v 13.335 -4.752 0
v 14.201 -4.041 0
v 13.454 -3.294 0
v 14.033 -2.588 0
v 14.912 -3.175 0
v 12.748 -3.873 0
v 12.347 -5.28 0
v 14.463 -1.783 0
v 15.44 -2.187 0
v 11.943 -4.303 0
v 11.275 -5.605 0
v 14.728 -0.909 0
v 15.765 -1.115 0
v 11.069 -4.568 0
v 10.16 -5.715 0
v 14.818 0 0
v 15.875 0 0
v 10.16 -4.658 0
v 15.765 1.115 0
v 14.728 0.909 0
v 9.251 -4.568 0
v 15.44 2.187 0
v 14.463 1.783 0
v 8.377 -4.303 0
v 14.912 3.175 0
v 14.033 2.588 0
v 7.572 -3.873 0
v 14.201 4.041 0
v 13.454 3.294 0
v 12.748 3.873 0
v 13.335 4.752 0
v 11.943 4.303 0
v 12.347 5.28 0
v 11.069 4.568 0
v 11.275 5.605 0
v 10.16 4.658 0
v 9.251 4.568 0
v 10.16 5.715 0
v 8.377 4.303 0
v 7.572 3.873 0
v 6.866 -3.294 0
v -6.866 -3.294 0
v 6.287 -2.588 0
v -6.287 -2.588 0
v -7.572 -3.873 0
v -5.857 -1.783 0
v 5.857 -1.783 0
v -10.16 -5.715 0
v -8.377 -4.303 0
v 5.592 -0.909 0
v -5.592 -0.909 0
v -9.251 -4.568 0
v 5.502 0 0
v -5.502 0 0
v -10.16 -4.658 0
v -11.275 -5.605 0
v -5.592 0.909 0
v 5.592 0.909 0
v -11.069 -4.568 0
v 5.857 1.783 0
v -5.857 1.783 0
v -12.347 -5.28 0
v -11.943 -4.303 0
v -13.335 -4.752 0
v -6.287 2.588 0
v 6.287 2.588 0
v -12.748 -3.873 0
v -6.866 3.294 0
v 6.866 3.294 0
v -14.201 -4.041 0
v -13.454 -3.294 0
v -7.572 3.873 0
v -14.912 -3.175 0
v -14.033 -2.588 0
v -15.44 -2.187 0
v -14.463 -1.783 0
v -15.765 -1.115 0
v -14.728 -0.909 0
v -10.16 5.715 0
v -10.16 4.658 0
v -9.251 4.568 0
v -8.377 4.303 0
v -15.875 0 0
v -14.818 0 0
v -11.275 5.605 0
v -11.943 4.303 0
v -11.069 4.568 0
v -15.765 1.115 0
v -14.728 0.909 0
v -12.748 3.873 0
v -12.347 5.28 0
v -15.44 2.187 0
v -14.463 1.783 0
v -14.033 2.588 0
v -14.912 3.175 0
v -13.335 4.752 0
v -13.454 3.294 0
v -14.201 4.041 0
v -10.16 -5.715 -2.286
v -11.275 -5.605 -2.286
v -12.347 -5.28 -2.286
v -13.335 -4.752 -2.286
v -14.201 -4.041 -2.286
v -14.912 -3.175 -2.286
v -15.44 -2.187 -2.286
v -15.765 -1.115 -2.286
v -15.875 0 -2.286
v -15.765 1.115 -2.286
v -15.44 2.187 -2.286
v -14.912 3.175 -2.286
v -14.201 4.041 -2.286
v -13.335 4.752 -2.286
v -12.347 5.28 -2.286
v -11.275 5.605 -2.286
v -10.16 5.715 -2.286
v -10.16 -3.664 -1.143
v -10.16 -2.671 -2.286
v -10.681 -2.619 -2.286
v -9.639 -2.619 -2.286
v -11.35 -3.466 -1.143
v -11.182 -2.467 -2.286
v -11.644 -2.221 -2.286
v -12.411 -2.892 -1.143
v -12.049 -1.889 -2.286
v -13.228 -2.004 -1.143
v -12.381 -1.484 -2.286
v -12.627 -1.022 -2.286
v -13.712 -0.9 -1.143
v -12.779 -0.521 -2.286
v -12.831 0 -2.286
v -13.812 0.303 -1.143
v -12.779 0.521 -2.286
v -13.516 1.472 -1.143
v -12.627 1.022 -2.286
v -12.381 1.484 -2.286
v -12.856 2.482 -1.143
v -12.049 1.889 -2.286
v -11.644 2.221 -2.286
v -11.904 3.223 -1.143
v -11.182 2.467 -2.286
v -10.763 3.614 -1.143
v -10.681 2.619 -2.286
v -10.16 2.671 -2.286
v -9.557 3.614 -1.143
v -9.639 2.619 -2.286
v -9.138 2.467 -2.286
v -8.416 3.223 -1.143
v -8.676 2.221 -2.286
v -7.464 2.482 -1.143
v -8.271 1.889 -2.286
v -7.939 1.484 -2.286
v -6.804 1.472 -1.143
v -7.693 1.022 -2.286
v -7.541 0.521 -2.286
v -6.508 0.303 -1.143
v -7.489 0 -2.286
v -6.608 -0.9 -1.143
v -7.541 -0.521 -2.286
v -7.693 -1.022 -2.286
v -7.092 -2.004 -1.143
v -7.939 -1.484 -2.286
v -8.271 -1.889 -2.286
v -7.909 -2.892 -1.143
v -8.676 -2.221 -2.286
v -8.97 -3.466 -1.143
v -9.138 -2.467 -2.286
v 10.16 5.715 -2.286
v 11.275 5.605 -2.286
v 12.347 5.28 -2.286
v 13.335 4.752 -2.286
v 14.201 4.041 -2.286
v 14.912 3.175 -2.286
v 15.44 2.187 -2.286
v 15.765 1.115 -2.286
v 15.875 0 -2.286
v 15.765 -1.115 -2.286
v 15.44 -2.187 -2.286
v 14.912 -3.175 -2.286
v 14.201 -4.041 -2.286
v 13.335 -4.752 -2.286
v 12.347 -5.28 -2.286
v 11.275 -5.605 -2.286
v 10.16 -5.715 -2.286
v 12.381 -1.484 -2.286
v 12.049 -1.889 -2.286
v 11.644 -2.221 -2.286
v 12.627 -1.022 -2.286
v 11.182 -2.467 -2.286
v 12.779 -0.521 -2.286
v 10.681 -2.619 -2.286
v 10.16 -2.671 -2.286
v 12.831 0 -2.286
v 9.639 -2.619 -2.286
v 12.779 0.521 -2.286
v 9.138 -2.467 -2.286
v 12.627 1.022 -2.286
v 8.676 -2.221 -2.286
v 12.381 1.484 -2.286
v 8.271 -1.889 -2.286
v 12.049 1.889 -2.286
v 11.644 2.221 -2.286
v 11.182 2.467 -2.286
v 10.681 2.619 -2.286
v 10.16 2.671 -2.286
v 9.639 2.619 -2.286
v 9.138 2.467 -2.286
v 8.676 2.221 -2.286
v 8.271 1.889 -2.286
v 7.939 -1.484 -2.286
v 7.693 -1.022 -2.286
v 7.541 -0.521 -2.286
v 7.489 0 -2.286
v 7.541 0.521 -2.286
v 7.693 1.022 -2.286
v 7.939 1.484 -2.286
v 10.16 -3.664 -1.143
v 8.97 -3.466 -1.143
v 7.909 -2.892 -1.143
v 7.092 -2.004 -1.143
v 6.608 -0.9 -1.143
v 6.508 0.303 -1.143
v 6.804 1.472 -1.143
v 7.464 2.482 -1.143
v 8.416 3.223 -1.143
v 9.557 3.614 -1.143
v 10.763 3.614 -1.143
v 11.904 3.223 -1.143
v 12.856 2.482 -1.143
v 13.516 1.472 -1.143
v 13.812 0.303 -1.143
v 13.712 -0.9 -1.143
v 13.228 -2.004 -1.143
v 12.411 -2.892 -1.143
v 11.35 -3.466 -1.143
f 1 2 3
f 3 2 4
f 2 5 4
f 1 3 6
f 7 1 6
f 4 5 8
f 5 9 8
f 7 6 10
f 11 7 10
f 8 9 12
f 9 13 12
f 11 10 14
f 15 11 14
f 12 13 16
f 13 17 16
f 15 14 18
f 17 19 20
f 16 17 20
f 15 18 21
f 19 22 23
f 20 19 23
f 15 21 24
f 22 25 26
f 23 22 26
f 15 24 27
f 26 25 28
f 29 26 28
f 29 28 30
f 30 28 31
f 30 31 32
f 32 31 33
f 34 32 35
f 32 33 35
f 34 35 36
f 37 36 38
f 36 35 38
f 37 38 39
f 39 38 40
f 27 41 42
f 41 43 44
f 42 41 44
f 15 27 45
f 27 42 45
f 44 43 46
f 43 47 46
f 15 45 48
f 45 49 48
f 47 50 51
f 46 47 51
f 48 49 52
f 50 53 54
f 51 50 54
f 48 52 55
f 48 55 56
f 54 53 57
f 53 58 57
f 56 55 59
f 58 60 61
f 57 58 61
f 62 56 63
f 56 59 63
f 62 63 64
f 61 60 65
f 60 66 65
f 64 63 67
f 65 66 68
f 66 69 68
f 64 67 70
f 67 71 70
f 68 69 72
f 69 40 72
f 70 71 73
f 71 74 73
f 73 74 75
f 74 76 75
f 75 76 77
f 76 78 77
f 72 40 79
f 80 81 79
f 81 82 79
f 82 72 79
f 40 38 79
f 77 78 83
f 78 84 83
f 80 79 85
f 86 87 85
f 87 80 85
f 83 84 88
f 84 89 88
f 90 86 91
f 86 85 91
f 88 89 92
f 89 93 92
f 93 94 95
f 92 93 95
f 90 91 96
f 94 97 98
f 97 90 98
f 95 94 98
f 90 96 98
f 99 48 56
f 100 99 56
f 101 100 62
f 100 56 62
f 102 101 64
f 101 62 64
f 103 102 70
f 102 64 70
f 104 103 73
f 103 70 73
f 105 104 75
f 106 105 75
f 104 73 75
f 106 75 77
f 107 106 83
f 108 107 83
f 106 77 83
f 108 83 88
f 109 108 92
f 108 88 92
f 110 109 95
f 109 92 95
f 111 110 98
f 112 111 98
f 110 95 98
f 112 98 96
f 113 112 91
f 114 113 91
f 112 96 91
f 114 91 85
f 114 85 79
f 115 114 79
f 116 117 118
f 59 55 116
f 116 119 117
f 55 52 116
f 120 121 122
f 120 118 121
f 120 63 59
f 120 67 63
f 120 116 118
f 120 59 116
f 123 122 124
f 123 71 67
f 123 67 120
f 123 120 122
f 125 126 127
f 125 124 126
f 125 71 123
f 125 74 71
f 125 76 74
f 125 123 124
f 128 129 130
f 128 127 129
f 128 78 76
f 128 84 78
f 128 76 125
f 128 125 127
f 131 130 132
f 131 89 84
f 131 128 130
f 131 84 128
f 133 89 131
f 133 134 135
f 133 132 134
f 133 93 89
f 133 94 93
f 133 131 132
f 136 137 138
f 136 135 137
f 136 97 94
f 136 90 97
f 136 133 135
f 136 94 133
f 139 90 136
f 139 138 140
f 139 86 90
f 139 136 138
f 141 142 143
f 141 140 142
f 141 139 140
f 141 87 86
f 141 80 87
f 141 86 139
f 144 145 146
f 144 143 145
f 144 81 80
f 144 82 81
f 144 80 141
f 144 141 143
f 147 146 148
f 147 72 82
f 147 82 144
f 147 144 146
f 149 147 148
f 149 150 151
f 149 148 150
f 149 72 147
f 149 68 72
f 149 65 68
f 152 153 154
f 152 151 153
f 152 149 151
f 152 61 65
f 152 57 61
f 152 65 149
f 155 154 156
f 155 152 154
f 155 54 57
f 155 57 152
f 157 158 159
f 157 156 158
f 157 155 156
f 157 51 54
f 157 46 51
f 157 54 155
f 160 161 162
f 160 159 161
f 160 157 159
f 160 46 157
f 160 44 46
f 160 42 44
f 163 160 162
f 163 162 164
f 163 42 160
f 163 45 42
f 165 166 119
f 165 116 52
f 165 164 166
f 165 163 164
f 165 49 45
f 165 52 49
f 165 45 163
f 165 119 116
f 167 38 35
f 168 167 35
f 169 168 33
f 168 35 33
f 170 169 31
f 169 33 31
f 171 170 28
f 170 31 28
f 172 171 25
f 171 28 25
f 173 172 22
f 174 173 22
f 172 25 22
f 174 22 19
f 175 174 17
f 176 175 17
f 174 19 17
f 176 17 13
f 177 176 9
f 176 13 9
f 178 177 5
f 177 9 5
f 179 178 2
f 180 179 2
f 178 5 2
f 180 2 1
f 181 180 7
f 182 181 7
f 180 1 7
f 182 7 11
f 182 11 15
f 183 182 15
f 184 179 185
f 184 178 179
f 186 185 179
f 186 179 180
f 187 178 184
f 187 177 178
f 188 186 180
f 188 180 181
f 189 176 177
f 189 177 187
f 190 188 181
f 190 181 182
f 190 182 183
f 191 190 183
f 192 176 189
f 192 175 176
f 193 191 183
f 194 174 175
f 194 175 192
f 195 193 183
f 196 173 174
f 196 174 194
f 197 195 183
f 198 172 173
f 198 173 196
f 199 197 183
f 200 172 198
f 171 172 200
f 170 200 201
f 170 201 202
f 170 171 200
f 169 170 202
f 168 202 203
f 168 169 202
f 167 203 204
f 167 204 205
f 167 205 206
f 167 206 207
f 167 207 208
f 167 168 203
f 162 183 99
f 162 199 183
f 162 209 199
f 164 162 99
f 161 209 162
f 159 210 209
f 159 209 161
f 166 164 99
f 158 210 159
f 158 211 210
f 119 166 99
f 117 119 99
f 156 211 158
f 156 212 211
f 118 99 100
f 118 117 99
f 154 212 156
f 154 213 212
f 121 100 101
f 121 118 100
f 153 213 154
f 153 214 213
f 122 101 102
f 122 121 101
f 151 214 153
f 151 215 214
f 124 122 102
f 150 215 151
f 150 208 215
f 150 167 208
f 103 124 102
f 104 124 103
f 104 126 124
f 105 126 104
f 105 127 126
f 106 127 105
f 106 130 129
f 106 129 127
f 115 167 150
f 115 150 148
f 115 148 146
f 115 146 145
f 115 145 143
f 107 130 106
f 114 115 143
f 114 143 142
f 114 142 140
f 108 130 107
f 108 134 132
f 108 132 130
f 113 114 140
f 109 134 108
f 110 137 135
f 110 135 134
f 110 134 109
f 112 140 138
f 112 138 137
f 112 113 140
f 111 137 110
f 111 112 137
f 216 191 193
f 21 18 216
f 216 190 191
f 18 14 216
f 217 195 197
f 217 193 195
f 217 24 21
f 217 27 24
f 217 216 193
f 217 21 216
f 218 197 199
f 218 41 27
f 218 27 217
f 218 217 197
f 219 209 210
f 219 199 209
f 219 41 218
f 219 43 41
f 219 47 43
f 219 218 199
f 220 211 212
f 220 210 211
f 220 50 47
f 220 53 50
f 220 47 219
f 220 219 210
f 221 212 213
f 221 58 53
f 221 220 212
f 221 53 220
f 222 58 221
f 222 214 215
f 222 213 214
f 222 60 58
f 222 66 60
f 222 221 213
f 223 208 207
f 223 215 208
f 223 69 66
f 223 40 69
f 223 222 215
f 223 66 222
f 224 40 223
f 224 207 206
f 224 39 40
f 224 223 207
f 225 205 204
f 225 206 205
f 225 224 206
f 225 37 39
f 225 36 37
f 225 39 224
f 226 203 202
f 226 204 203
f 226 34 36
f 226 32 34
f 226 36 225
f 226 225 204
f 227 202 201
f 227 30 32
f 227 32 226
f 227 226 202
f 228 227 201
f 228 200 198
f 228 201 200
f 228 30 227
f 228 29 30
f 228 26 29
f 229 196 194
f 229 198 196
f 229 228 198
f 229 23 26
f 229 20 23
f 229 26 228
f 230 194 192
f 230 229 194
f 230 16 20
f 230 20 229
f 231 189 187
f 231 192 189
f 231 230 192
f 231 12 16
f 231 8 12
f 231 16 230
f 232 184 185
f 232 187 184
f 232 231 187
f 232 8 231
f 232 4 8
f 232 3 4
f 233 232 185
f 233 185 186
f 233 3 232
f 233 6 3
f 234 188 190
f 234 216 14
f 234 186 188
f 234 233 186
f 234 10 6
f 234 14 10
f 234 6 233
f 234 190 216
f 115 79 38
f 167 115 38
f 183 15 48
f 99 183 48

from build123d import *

# Parameters (mm, degrees)
BASE_FLANGE1_DEPTH                            = 2.286
CSK_FOR_8_FLAT_HEAD_MACHINE_SCREW1_AT_2_COUNT = 2
CSK_FOR_8_FLAT_HEAD_MACHINE_SCREW1_AT_2_PITCH = 20.32


# Sheet-metal steps are written as plain solids
with BuildPart() as part:
    # Sketch1 → Base-Flange1 (new body)
    with BuildSketch(Plane.XY):
        with BuildLine():
            Line((10.16, -5.715), (-10.16, -5.715))
            ThreePointArc((-10.16, -5.715), (-15.875, 0), (-10.16, 5.715))
            Line((-10.16, 5.715), (10.16, 5.715))
            ThreePointArc((10.16, 5.715), (15.875, 0), (10.16, -5.715))
        make_face()
    extrude(amount=-BASE_FLANGE1_DEPTH)

    # Sketch4 → CSK for #8 Flat Head Machine Screw1 (revolve, cut)
    with BuildSketch(Plane(origin=(-10.16, 0, 0), x_dir=(0, -1, 0), z_dir=(1, 0, 0))):
        Polygon((0, 0), (0, 2.286), (2.2479, 2.286), (2.2479, 2.77249335), (4.6579917, 0), align=None)
    csk_for_8_flat_head_machine_screw1 = revolve(axis=Axis((-10.16, 0, 6.35), (0, 0, -1)), mode=Mode.SUBTRACT)

    # CSK for #8 Flat Head Machine Screw1 at 2: CSK for #8 Flat Head Machine Screw1 ×2
    with Locations(*[(i * CSK_FOR_8_FLAT_HEAD_MACHINE_SCREW1_AT_2_PITCH, 0, 0) for i in range(1, CSK_FOR_8_FLAT_HEAD_MACHINE_SCREW1_AT_2_COUNT)]):
        add(csk_for_8_flat_head_machine_screw1, mode=Mode.SUBTRACT)


solid = part.part
